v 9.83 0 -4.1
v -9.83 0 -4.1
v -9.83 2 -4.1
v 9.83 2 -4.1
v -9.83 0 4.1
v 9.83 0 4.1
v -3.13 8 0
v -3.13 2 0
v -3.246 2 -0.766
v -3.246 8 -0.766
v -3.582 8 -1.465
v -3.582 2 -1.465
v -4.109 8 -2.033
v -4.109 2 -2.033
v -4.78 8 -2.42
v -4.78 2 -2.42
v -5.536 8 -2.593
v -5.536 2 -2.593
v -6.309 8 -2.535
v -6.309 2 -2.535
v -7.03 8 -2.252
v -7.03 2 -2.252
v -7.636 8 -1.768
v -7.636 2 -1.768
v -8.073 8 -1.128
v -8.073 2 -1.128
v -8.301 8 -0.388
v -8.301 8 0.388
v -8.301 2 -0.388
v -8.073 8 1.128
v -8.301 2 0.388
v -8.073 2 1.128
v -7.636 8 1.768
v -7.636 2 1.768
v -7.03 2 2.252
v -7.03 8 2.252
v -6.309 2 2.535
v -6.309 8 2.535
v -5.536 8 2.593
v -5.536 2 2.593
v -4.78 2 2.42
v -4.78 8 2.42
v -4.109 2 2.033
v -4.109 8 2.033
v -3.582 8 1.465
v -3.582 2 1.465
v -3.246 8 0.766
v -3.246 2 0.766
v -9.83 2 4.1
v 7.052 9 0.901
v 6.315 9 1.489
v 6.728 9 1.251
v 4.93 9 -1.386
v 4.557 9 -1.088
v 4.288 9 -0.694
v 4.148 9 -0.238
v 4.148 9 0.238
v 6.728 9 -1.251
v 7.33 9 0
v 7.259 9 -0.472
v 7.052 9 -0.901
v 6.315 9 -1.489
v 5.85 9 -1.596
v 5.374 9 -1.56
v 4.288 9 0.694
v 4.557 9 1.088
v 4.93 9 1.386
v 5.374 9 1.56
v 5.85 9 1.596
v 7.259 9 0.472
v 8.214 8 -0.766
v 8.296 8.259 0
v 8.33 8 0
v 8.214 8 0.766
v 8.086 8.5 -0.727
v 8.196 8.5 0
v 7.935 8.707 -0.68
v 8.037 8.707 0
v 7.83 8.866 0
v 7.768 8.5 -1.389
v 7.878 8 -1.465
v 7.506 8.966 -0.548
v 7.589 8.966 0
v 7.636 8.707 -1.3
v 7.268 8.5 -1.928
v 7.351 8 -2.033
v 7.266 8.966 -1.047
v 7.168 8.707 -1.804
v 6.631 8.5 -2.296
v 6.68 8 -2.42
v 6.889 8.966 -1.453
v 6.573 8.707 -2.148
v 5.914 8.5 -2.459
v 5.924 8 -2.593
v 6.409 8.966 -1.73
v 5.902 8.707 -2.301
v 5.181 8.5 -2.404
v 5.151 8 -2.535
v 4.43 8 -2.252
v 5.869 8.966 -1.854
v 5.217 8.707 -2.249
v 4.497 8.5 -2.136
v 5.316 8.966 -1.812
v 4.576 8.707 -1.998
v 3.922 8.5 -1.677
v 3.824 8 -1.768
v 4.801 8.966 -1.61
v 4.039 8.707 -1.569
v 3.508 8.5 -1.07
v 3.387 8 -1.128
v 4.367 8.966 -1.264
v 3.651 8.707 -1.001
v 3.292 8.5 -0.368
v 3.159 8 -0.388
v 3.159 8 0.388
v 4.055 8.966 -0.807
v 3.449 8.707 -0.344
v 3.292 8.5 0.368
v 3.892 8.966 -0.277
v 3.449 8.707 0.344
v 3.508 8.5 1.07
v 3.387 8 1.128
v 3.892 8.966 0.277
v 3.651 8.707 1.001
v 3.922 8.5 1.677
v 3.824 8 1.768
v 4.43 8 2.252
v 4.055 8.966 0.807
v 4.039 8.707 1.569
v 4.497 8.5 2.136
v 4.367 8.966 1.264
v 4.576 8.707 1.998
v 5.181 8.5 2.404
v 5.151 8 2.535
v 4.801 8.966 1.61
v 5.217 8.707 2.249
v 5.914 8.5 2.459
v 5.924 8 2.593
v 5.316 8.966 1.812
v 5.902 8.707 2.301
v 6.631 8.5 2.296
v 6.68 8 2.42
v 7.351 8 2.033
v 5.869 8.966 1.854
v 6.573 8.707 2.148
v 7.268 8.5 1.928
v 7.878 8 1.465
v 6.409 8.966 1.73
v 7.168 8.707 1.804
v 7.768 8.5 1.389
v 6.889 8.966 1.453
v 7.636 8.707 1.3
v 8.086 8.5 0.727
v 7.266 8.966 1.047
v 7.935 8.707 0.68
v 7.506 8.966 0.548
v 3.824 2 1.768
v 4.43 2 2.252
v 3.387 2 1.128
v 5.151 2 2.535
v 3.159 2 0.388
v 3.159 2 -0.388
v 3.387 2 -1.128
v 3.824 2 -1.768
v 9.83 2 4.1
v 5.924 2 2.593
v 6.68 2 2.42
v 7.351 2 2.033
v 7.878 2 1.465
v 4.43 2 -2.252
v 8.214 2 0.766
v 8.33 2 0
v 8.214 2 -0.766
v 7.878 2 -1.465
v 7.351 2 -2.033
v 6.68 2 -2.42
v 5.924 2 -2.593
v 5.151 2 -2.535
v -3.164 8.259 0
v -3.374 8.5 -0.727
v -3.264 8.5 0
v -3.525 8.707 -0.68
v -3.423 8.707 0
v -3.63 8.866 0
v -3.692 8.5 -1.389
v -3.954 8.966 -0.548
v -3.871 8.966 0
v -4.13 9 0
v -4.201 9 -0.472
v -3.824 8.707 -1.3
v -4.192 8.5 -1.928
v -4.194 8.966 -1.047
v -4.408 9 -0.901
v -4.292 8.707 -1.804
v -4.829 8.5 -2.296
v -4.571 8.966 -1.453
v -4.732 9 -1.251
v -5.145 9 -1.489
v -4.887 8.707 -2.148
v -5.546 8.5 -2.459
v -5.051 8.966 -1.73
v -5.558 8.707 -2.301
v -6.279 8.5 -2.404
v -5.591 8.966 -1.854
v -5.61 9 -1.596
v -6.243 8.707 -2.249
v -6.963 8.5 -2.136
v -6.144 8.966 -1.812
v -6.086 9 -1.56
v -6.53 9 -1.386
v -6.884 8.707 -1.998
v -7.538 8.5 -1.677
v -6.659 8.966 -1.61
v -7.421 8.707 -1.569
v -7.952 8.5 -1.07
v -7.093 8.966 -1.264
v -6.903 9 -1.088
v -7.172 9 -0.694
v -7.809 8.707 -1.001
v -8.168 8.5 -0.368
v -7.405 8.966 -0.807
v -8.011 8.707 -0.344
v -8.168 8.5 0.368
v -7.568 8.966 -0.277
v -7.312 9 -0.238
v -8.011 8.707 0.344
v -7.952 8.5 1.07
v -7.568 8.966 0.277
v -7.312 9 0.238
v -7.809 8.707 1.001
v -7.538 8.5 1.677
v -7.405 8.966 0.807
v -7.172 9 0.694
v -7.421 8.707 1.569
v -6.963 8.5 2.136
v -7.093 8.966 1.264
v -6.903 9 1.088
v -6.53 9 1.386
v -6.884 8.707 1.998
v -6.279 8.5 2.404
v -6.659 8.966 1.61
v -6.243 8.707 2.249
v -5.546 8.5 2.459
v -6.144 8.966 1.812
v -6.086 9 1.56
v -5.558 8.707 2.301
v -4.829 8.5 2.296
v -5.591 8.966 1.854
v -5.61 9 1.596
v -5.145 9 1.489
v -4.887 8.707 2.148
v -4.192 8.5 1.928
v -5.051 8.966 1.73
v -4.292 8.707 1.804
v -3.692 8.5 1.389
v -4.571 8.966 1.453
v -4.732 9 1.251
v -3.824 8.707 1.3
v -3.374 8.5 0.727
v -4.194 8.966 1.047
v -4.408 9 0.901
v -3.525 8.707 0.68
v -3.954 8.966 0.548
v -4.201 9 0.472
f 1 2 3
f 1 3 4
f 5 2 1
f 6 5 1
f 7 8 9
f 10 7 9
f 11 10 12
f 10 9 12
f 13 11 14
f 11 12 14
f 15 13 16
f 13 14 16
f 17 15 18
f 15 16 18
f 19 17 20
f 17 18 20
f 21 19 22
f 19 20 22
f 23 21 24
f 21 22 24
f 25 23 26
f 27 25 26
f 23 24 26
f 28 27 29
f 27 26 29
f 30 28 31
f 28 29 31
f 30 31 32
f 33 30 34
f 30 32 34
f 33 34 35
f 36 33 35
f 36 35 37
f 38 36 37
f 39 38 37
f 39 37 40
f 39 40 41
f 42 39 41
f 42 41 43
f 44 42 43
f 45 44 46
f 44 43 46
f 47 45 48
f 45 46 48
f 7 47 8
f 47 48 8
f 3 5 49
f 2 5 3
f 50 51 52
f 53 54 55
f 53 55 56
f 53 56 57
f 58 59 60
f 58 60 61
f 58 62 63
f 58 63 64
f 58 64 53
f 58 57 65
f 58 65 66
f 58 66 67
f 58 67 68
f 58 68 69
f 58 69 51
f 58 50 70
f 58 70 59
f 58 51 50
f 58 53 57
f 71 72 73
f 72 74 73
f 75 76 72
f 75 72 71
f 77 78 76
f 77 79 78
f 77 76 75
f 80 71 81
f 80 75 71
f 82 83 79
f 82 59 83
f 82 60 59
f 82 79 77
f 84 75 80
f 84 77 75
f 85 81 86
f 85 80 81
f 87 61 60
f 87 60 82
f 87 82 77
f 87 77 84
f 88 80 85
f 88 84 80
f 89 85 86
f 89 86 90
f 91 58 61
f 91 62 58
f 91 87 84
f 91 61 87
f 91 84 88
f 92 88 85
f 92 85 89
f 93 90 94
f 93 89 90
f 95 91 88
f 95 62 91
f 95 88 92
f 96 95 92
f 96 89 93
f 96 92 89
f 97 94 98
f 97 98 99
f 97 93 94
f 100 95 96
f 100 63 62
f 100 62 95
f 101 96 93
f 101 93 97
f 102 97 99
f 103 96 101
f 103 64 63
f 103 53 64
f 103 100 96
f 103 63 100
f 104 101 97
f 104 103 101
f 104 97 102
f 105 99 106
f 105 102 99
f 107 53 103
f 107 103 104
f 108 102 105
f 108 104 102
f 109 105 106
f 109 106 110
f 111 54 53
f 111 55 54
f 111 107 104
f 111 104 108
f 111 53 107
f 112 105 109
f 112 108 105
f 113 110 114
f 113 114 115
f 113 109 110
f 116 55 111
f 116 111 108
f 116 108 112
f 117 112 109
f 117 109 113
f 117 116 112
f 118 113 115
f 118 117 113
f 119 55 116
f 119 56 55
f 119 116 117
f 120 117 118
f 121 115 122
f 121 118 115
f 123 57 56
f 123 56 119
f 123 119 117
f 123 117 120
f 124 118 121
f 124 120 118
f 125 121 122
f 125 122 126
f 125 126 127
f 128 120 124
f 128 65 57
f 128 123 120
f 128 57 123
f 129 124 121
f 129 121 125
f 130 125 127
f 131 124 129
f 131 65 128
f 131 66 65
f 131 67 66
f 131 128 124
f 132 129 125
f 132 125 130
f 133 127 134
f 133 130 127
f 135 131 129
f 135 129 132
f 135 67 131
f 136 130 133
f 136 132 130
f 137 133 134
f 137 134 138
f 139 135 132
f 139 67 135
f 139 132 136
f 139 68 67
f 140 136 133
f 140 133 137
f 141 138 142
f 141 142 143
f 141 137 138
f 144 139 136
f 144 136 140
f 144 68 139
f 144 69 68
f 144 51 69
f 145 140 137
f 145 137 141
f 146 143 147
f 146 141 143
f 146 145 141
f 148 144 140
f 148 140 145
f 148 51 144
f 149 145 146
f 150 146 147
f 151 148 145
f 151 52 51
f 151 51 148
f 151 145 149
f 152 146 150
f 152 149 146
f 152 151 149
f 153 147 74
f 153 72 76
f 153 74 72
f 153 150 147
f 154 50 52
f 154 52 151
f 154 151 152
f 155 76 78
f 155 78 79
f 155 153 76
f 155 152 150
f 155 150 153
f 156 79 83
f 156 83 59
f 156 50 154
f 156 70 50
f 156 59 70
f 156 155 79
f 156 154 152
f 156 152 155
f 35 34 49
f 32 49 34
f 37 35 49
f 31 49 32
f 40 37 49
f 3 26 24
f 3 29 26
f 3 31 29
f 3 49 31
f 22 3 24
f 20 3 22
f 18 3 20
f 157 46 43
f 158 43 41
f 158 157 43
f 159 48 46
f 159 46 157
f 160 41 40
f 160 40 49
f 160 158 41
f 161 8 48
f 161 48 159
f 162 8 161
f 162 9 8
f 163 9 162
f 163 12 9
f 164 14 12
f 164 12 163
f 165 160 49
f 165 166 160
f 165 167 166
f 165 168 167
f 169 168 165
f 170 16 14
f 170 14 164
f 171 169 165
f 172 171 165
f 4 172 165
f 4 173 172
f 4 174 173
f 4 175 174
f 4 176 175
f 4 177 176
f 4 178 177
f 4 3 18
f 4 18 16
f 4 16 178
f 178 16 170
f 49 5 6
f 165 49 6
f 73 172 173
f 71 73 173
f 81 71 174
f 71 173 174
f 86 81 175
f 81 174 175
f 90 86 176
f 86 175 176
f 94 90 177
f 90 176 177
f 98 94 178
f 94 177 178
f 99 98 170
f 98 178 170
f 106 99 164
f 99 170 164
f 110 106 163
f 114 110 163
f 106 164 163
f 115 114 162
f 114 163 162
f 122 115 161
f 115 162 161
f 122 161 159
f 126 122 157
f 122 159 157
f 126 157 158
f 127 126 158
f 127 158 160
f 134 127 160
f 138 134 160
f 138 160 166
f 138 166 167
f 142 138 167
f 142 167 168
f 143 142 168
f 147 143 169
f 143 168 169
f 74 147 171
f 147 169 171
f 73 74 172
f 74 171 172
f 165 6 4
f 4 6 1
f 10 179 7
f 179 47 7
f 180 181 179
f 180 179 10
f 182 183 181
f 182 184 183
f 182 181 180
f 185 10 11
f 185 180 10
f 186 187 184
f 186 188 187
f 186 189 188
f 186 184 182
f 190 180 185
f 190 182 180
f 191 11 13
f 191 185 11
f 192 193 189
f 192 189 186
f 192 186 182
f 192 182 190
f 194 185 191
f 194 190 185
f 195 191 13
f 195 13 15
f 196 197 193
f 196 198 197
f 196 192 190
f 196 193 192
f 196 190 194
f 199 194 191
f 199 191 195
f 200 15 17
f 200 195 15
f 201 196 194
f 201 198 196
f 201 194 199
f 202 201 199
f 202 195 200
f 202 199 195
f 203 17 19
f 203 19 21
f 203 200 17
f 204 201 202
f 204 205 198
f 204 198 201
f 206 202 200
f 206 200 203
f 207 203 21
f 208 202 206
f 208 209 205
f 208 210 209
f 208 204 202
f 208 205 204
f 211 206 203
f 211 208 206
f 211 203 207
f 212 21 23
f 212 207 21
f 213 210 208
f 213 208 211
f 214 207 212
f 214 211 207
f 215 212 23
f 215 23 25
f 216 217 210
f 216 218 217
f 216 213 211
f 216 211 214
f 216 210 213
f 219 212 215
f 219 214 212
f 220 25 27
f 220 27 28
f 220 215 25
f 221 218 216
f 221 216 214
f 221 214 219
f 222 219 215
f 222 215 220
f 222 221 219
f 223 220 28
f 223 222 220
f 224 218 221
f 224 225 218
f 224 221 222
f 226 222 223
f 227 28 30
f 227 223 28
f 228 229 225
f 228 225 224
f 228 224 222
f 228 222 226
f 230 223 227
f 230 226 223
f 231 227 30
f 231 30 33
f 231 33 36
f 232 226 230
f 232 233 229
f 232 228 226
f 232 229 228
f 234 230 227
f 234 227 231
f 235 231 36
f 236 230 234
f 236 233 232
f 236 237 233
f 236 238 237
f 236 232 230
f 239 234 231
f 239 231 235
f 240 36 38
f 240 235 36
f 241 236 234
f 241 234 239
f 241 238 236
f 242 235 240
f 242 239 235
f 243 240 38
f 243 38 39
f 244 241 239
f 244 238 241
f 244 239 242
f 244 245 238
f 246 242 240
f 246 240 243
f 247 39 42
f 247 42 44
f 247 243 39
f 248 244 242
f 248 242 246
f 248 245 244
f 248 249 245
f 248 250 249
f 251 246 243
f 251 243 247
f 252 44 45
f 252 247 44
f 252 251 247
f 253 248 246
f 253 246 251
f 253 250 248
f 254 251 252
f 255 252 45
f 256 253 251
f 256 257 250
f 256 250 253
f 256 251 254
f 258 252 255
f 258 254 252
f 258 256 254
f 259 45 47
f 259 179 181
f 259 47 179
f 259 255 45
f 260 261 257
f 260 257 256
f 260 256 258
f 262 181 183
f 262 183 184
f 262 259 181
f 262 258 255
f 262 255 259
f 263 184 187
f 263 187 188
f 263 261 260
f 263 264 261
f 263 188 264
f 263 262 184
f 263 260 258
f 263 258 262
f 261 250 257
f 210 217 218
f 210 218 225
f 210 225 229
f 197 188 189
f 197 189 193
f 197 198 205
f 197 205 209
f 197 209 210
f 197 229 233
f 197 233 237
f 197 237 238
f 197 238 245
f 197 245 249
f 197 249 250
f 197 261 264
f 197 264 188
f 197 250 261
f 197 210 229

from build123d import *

# Parameters (mm, degrees)
SKETCH2_W           = 19.66
SKETCH2_H           = 8.2
BOSS_EXTRUDE1_DEPTH = 2
SKETCH3_R           = 2.6
BOSS_EXTRUDE2_DEPTH = 7
FILLET1_R           = 1


with BuildPart() as part:
    # Sketch2 → Boss-Extrude1 (new body)
    with BuildSketch(Plane(origin=(0, 0, 0), x_dir=(1, 0, 0), z_dir=(0, 1, 0))):
        Rectangle(SKETCH2_W, SKETCH2_H)
    extrude(amount=BOSS_EXTRUDE1_DEPTH)

    # Sketch3 → Boss-Extrude2 (add)
    with BuildSketch(Plane(origin=(0, 2, 0), x_dir=(1, 0, 0), z_dir=(0, 1, 0))):
        with Locations((-5.73, 0)):
            Circle(SKETCH3_R)
        with Locations((5.73, 0)):
            Circle(SKETCH3_R)
    extrude(amount=BOSS_EXTRUDE2_DEPTH)

    # Fillet1
    fillet1_edges = [part.edges().sort_by_distance(p)[0] for p in [
        (-8.33, 9, 0),
        (3.13, 9, 0),
    ]]
    fillet(fillet1_edges, radius=FILLET1_R)


solid = part.part
